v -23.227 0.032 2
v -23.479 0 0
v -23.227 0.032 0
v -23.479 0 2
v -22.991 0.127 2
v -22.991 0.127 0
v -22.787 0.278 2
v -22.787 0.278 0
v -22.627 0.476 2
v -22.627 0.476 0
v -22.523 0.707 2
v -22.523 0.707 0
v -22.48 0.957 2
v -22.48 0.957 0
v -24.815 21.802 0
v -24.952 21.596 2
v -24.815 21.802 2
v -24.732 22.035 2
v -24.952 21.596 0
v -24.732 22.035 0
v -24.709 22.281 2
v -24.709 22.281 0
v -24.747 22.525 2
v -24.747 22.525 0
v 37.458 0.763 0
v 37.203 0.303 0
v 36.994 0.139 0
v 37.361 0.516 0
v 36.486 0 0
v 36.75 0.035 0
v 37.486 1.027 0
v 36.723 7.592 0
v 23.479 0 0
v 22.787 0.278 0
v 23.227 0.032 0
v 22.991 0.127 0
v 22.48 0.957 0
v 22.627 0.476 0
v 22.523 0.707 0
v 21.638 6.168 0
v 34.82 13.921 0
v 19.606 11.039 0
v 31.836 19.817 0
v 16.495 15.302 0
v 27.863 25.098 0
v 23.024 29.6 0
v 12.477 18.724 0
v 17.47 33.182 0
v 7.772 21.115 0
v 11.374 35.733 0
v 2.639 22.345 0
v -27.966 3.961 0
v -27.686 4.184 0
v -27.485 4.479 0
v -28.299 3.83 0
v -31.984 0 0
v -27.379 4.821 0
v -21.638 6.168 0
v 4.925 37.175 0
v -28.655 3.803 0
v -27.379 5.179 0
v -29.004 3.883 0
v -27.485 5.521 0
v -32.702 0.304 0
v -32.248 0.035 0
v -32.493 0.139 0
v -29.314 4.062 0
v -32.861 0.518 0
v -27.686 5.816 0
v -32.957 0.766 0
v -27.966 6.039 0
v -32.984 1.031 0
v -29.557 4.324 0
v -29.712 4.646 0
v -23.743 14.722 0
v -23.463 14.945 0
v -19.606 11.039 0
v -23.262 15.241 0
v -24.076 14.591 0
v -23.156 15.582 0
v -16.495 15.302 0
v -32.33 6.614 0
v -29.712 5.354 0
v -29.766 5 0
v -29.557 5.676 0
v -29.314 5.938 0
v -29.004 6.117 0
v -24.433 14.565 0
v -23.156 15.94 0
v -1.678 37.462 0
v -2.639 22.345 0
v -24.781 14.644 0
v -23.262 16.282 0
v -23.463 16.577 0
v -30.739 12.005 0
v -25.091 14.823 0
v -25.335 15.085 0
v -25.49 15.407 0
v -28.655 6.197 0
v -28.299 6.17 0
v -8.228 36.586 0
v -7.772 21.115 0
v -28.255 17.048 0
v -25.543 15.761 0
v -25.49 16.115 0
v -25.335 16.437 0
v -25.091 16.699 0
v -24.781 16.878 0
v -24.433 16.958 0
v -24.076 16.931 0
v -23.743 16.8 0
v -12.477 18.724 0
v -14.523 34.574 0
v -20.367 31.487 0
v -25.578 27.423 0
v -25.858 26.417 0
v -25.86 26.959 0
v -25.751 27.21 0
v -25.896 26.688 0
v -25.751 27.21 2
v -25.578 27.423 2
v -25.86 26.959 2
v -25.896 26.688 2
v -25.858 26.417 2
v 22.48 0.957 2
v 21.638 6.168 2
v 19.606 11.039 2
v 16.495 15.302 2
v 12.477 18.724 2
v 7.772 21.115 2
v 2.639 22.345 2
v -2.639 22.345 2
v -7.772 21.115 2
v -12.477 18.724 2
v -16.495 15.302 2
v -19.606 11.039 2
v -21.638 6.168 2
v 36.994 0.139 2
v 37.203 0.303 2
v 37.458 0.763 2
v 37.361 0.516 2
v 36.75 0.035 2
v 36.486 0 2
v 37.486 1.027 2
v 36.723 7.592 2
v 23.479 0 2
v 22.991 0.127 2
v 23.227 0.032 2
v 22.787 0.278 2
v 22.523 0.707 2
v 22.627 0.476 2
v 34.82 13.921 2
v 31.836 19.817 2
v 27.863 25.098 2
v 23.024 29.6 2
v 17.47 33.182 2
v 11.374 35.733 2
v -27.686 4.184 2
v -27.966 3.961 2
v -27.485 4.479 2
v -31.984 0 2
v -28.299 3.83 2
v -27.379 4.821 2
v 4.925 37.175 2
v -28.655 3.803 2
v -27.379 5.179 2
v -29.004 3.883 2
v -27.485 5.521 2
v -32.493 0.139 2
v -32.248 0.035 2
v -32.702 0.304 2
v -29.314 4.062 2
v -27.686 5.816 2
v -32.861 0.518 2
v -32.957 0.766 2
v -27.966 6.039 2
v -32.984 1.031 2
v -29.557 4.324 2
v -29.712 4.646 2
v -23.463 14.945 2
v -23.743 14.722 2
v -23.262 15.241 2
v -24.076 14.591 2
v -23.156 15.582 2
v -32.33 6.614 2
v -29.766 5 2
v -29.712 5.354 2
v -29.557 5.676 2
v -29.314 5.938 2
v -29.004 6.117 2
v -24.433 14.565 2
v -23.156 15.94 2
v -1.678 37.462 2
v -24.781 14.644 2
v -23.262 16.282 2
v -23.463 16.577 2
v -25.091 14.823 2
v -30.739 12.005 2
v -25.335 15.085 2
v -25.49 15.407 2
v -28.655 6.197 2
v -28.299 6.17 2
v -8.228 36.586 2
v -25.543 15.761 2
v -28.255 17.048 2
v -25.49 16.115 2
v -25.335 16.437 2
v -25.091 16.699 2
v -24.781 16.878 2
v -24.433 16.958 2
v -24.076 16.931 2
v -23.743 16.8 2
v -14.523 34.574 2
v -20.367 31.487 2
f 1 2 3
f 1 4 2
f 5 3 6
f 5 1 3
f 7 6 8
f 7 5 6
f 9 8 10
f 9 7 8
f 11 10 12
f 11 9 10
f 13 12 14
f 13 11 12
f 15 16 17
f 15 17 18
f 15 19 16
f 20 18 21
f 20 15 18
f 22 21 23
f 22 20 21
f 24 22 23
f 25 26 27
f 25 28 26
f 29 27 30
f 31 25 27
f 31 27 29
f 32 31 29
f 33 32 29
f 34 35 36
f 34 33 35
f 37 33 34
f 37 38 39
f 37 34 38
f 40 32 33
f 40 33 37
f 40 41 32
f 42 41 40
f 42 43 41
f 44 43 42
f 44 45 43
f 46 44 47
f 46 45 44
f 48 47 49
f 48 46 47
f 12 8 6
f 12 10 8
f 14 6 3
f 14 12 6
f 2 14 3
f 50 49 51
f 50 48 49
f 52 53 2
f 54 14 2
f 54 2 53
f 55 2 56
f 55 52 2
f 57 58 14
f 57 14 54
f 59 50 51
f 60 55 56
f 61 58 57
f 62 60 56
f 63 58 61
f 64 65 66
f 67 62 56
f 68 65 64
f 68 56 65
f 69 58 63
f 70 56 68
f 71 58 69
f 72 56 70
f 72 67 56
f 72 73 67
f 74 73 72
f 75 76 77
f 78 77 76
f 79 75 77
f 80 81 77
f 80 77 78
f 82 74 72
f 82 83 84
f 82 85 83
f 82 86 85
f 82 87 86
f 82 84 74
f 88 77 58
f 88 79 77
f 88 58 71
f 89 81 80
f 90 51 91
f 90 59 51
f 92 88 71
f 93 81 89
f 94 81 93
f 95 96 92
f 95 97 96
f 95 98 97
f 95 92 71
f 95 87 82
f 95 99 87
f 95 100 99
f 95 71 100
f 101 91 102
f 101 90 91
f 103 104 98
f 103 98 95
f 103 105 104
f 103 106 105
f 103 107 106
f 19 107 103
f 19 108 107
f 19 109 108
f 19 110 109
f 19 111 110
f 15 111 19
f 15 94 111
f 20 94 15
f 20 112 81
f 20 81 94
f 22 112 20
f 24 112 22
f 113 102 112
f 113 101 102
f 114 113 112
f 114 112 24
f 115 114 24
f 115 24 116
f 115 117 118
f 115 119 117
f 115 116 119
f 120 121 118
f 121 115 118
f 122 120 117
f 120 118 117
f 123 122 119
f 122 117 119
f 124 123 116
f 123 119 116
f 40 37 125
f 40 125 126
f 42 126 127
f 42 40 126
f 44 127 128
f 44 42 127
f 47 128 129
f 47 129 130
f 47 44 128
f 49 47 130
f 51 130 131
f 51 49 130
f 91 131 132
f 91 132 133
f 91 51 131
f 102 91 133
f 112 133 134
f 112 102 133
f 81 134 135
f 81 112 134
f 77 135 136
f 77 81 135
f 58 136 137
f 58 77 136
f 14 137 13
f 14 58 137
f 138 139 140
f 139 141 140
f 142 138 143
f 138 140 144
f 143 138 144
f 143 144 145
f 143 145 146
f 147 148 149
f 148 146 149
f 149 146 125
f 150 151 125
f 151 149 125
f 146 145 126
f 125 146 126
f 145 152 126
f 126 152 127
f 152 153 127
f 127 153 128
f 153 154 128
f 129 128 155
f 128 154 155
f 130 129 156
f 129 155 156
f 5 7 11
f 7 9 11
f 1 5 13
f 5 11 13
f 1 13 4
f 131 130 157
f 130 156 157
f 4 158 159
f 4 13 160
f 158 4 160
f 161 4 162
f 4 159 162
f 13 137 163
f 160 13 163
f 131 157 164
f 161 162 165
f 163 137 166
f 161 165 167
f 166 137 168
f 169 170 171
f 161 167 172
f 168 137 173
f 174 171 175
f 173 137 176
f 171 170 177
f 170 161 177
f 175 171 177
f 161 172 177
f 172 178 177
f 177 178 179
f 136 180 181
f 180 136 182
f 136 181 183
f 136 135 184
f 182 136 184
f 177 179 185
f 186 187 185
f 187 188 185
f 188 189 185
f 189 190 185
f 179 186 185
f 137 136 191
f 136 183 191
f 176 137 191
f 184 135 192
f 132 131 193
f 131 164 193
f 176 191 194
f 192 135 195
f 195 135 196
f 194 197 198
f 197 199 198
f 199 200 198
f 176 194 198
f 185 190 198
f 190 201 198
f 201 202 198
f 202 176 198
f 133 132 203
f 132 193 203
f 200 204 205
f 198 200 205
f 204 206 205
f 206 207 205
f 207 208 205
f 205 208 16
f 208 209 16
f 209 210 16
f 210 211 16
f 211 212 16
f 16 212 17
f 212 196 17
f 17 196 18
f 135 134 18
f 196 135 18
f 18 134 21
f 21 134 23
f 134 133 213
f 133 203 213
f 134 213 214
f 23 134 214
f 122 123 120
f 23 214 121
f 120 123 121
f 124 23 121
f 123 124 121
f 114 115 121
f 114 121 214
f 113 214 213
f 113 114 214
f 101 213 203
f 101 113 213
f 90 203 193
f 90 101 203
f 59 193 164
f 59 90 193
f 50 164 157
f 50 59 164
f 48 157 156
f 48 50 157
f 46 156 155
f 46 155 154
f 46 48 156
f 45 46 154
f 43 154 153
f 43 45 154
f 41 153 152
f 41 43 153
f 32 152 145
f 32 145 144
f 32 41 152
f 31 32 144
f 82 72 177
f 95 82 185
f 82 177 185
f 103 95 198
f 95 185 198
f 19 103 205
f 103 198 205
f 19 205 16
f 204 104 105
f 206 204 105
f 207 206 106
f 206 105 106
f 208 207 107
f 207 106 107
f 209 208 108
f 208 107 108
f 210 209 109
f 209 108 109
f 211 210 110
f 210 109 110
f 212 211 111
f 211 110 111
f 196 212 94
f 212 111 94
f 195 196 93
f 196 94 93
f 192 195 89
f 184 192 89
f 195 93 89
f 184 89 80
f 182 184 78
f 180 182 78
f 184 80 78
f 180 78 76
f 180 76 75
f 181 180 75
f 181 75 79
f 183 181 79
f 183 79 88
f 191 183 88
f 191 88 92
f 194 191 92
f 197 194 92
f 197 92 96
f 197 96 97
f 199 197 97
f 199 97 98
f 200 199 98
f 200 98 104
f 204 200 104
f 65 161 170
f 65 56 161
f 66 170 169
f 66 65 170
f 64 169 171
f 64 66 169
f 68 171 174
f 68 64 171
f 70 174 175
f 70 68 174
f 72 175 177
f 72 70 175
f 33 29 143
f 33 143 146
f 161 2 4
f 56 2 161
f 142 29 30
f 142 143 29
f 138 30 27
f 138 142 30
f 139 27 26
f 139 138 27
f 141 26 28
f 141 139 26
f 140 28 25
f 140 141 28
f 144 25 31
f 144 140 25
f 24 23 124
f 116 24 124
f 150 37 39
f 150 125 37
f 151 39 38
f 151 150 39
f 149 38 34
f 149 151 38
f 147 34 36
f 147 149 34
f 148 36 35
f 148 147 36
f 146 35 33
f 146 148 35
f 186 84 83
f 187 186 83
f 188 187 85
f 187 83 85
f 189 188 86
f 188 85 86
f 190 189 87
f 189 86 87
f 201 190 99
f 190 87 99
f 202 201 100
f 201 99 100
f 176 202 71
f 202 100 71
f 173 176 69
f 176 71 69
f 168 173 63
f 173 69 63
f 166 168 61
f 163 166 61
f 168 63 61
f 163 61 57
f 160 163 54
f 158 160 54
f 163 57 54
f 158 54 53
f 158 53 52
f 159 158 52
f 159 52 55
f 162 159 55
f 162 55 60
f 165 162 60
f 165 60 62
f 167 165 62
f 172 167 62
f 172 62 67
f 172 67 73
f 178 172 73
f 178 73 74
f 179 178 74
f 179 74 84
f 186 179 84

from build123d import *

# Parameters (mm, degrees)
BOSS_EXTRU_1_DEPTH      = 2
D_GAGEMENT_M21_D        = 2.4
D_GAGEMENT_M21_DEPTH    = 10
D_GAGEMENT_M21_TIP      = 0.721032743
ENL_V_MAT_EXTRU_1_REACH = 4
CONG_1_R                = 1


with BuildPart() as part:
    # Esquisse1 → Boss.-Extru.1 (new body)
    with BuildSketch(Plane.XY):
        with BuildLine():
            Line((-22.5, 0), (-37.5, 0))
            ThreePointArc((-37.5, 0), (0, 37.5), (37.5, 0))
            Line((37.5, 0), (22.5, 0))
            ThreePointArc((22.5, 0), (0, 22.5), (-22.5, 0))
        make_face()
    extrude(amount=BOSS_EXTRU_1_DEPTH)

    # Dégagement M21
    with Locations(Plane.XY.offset(2)):
        with Locations((-28.565713714, 5), (-24.343075181, 15.761176693)):
            Hole(D_GAGEMENT_M21_D / 2, depth=D_GAGEMENT_M21_DEPTH)
            with Locations((0, 0, -(D_GAGEMENT_M21_DEPTH + D_GAGEMENT_M21_TIP / 2))):  # 118° drill point
                Cone(0, D_GAGEMENT_M21_D / 2, D_GAGEMENT_M21_TIP, mode=Mode.SUBTRACT)

    # Esquisse7 → Enlèv. mat.-Extru.1 (cut, up to next)
    with BuildSketch(Plane.XY.offset(2), mode=Mode.PRIVATE) as enl_v_mat_extru_1_sk1:
        with BuildLine():
            Line((-24.596747752, 22), (-26.024027359, 27))
            ThreePointArc((-26.024027359, 27), (-34.511961883, 14.66882705), (-37.5, 0))
            Line((-37.5, 0), (-33, 0))
            ThreePointArc((-33, 0), (-30.827687846, 11.775128963), (-24.596747752, 22))
        make_face()
    enl_v_mat_extru_1_tool1 = extrude(enl_v_mat_extru_1_sk1.sketch, amount=-ENL_V_MAT_EXTRU_1_REACH, mode=Mode.PRIVATE) & part.part
    add(enl_v_mat_extru_1_tool1.solids().sort_by_distance((-31.93558, 12.954639, 2))[0], mode=Mode.SUBTRACT)

    # Congé1
    cong_1_edges = [part.edges().sort_by_distance(p)[0] for p in [
        (-24.596747752, 22, 1),
        (-33, 0, 1),
        (-26.024027359, 27, 1),
        (-22.5, 0, 1),
        (37.5, 0, 1),
        (22.5, 0, 1),
    ]]
    fillet(cong_1_edges, radius=CONG_1_R)


solid = part.part
